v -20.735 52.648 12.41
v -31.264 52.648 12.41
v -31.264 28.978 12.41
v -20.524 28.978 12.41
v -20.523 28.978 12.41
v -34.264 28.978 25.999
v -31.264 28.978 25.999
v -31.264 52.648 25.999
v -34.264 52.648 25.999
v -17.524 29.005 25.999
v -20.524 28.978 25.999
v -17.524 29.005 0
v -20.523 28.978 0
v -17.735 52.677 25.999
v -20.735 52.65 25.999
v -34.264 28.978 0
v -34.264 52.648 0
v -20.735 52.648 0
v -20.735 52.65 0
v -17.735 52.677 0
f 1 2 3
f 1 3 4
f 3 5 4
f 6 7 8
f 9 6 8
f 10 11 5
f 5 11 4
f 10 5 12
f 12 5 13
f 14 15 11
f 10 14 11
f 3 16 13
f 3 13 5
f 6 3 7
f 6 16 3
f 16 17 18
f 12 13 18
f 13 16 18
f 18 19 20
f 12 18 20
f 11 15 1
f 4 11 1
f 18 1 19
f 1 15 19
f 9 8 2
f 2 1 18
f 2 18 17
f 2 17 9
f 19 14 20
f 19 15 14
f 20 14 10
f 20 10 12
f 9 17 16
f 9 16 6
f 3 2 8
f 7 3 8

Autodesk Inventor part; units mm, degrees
ref_plane "YZ Plane" through (0, 0, 0) normal (1, 0, 0) x (0, 1, 0)
ref_plane "XZ Plane" through (0, 0, 0) normal (0, 1, 0) x (-1, 0, 0)
ref_plane "XY Plane" through (0, 0, 0) normal (0, 0, 1) x (1, 0, 0)
sketch "Sketch1" plane through (0, 0, 0) normal (0, 0, 1) x (1, 0, 0)
  line L0 (-20.9848, 52.6481) -> (-30.7638, 52.6481) projected
  line L1 (-30.7638, 20.8981) -> (-30.7638, 52.6481) projected
  line L2 (-20.9848, 20.8981) -> (-30.7638, 20.8981) projected
  line L3 (-20.9848, 52.6481) -> (-20.9848, 20.8981) projected
  line L4 (-22.6993, 26.2773) -> (-22.6993, 24.127) projected
  line L5 (-22.6993, 24.127) -> (-29.0493, 24.127) projected
  line L6 (-29.0493, 24.127) -> (-29.0493, 26.2773) projected
  line L7 (-29.0493, 26.2773) -> (-22.6993, 26.2773) projected
  line L8 (-22.6993, 32.7351) -> (-22.6993, 30.5848) projected
  line L9 (-22.6993, 30.5848) -> (-29.0493, 30.5848) projected
  line L10 (-29.0493, 30.5848) -> (-29.0493, 32.7351) projected
  line L11 (-29.0493, 32.7351) -> (-22.6993, 32.7351) projected
  line L12 (-22.6993, 39.1928) -> (-22.6993, 37.0425) projected
  line L13 (-22.6993, 37.0425) -> (-29.0493, 37.0425) projected
  line L14 (-29.0493, 37.0425) -> (-29.0493, 39.1928) projected
  line L15 (-29.0493, 39.1928) -> (-22.6993, 39.1928) projected
  line L16 (-22.6993, 45.6505) -> (-22.6993, 43.5002) projected
  line L17 (-22.6993, 43.5002) -> (-29.0493, 43.5002) projected
  line L18 (-29.0493, 43.5002) -> (-29.0493, 45.6505) projected
  line L19 (-29.0493, 45.6505) -> (-22.6993, 45.6505) projected
  line L20 (-22.6993, 52.1083) -> (-22.6993, 49.958) projected
  line L21 (-22.6993, 49.958) -> (-29.0493, 49.958) projected
  line L22 (-29.0493, 49.958) -> (-29.0493, 52.1083) projected
  line L23 (-29.0493, 52.1083) -> (-22.6993, 52.1083) projected
  line L24 (-22.6993, 48.8794) -> (-22.6993, 46.7291) projected
  line L25 (-22.6993, 46.7291) -> (-29.0493, 46.7291) projected
  line L26 (-29.0493, 46.7291) -> (-29.0493, 48.8794) projected
  line L27 (-29.0493, 48.8794) -> (-22.6993, 48.8794) projected
  line L28 (-22.6993, 42.4217) -> (-22.6993, 40.2714) projected
  line L29 (-22.6993, 40.2714) -> (-29.0493, 40.2714) projected
  line L30 (-29.0493, 40.2714) -> (-29.0493, 42.4217) projected
  line L31 (-29.0493, 42.4217) -> (-22.6993, 42.4217) projected
  line L32 (-22.6993, 35.9639) -> (-22.6993, 33.8136) projected
  line L33 (-22.6993, 33.8136) -> (-29.0493, 33.8136) projected
  line L34 (-29.0493, 33.8136) -> (-29.0493, 35.9639) projected
  line L35 (-29.0493, 35.9639) -> (-22.6993, 35.9639) projected
  line L36 (-22.6993, 29.5062) -> (-22.6993, 27.3559) projected
  line L37 (-22.6993, 27.3559) -> (-29.0493, 27.3559) projected
  line L38 (-29.0493, 27.3559) -> (-29.0493, 29.5062) projected
  line L39 (-29.0493, 29.5062) -> (-22.6993, 29.5062) projected
  line L40 (-22.6993, 23.0485) -> (-22.6993, 20.8982) projected
  line L41 (-22.6993, 20.8982) -> (-29.0493, 20.8982) projected
  line L42 (-29.0493, 20.8982) -> (-29.0493, 23.0485) projected
  line L43 (-29.0493, 23.0485) -> (-22.6993, 23.0485) projected
  line L44 (-20.9848, 20.8981) -> (-20.4848, 20.8981)
  line L45 (-20.4848, 20.8981) -> (-30.7638, 20.8981)
  line L46 (-30.7638, 20.8981) -> (-31.2638, 20.8981)
  line L47 (-30.7638, 20.8981) -> (-30.7638, 24.7081) projected
  line L48 (-30.8638, 52.6481) -> (-20.7348, 52.6481)
  line L49 (-20.7348, 52.6481) -> (-20.4848, 24.7081)
  line L50 (-20.4848, 24.7081) -> (-30.8638, 24.7081)
  line L51 (-30.8638, 24.7081) -> (-31.2638, 24.7081)
  line L52 (-31.2638, 24.7081) -> (-31.2638, 52.6481)
  line L53 (-31.2638, 52.6481) -> (-20.7348, 52.6481)
  point P0 (0, 0)
  dimension "d0" = 0.5
  dimension "d1" = 0.5
extrude "Extrusion1" add sketch "Sketch1" along normal blind 12.41 contours L3 L50 L4 L7 L6 L1 L0 | L48 L49 L50 L3 | L1 L50 L51 L52 L53 L48 | L50 L6 L7 L4 | L8 L9 L10 L11 | L12 L13 L14 L15 | L16 L17 L18 L19 | L20 L21 L22 L23 | L24 L25 L26 L27 | L28 L29 L30 L31 | L32 L33 L34 L35 | L36 L37 L38 L39
sketch "Sketch2" plane through (-31.2638, 24.7081, 0) normal (-1, 0, 0) x (0, 0, 1)
  line L0 (12.41, 1.27) -> (22.57, 1.27) projected
  line L1 (12.41, 1.27) -> (0, 1.27)
  line L2 (0, 1.27) -> (0, 4.27)
  line L3 (0, 4.27) -> (12.41, 4.27)
  line L4 (12.41, 4.27) -> (12.41, 1.27)
  line L5 (0, 0) -> (12.41, 0) projected
  line L6 (12.41, 0) -> (0, 0)
  line L7 (0, 0) -> (0, 1.27)
  line L8 (0, 1.27) -> (12.41, 1.27)
  line L9 (12.41, 1.27) -> (12.41, 0)
  point P0 (0, -24.7081)
  dimension "d4" = 3
extrude "Extrusion2" cut sketch "Sketch2" against normal blind 12.41
sketch "Sketch3" plane through (-31.2638, 52.6481, 0) normal (-1, 0, 0) x (0, 0, 1)
  line L0 (25.999, 0) -> (12.41, 0) projected
  line L1 (12.41, -26.67) -> (12.41, 0) projected
  line L2 (12.41, -26.67) -> (22.57, -26.67) projected
  line L3 (22.57, -26.67) -> (22.57, -27.94) projected
  line L4 (22.57, -27.94) -> (12.41, -27.94) projected
  line L5 (12.41, -31.75) -> (12.41, -27.94) projected
  line L6 (25.999, -31.75) -> (12.41, -31.75) projected
  line L7 (25.999, -31.75) -> (25.999, 0) projected
  line L8 (0, -23.67) -> (12.41, -23.67) projected
  line L9 (12.41, 0) -> (12.41, -23.67) projected
  line L10 (0, 0) -> (12.41, 0) projected
  line L11 (0, 0) -> (0, -23.67) projected
  line L12 (0, 0) -> (25.999, 0)
  line L13 (25.999, 0) -> (25.999, -23.67)
  line L14 (25.999, -23.67) -> (0, -23.67)
  line L15 (0, -23.67) -> (0, 0)
  point P0 (0, -52.6481)
extrude "Extrusion3" add sketch "Sketch3" along normal blind 3 contours L7 L14 L1 L0 | L1 L8 L11 L10
sketch "Sketch4" plane through (-20.7348, 52.6481, 12.41) normal (1, 0.0089, 0) x (0, 0, -1)
  line L0 (0, -23.6709) -> (12.41, -23.6709) projected
  line L1 (12.41, -23.6709) -> (12.41, 0) projected
  line L2 (12.41, 0) -> (0, 0) projected
  line L3 (0, -23.6709) -> (0, 0) projected
  line L4 (0, 0.0022) -> (-13.589, 0.0022) projected
  line L5 (-13.589, 0.0022) -> (-13.589, -31.7465) projected
  line L6 (-13.589, -31.7465) -> (0, -31.7465) projected
  line L7 (0, -27.9366) -> (0, -31.7465) projected
  line L8 (0, -27.9366) -> (-10.16, -27.9366) projected
  line L9 (-10.16, -27.9366) -> (-10.16, -26.6667) projected
  line L10 (-10.16, -26.6667) -> (0, -26.6667) projected
  line L11 (0, 0.0022) -> (0, -26.6667) projected
  line L12 (0, -23.6709) -> (12.41, -23.6709) projected
  line L13 (-13.589, 0.0022) -> (12.41, 0.0022)
  line L14 (12.41, 0.0022) -> (12.41, -23.6709)
  line L15 (12.41, -23.6709) -> (-13.589, -23.6709)
  line L16 (-13.589, -23.6709) -> (-13.589, 0.0022)
  point P0 (12.41, -52.8315)
extrude "Extrusion4" add sketch "Sketch4" along normal blind 3 contours L3 L2 L1 L0 | L15 L5 L4 L11 L3 | L11 L13 L14 L2
properties part number "Guide"
